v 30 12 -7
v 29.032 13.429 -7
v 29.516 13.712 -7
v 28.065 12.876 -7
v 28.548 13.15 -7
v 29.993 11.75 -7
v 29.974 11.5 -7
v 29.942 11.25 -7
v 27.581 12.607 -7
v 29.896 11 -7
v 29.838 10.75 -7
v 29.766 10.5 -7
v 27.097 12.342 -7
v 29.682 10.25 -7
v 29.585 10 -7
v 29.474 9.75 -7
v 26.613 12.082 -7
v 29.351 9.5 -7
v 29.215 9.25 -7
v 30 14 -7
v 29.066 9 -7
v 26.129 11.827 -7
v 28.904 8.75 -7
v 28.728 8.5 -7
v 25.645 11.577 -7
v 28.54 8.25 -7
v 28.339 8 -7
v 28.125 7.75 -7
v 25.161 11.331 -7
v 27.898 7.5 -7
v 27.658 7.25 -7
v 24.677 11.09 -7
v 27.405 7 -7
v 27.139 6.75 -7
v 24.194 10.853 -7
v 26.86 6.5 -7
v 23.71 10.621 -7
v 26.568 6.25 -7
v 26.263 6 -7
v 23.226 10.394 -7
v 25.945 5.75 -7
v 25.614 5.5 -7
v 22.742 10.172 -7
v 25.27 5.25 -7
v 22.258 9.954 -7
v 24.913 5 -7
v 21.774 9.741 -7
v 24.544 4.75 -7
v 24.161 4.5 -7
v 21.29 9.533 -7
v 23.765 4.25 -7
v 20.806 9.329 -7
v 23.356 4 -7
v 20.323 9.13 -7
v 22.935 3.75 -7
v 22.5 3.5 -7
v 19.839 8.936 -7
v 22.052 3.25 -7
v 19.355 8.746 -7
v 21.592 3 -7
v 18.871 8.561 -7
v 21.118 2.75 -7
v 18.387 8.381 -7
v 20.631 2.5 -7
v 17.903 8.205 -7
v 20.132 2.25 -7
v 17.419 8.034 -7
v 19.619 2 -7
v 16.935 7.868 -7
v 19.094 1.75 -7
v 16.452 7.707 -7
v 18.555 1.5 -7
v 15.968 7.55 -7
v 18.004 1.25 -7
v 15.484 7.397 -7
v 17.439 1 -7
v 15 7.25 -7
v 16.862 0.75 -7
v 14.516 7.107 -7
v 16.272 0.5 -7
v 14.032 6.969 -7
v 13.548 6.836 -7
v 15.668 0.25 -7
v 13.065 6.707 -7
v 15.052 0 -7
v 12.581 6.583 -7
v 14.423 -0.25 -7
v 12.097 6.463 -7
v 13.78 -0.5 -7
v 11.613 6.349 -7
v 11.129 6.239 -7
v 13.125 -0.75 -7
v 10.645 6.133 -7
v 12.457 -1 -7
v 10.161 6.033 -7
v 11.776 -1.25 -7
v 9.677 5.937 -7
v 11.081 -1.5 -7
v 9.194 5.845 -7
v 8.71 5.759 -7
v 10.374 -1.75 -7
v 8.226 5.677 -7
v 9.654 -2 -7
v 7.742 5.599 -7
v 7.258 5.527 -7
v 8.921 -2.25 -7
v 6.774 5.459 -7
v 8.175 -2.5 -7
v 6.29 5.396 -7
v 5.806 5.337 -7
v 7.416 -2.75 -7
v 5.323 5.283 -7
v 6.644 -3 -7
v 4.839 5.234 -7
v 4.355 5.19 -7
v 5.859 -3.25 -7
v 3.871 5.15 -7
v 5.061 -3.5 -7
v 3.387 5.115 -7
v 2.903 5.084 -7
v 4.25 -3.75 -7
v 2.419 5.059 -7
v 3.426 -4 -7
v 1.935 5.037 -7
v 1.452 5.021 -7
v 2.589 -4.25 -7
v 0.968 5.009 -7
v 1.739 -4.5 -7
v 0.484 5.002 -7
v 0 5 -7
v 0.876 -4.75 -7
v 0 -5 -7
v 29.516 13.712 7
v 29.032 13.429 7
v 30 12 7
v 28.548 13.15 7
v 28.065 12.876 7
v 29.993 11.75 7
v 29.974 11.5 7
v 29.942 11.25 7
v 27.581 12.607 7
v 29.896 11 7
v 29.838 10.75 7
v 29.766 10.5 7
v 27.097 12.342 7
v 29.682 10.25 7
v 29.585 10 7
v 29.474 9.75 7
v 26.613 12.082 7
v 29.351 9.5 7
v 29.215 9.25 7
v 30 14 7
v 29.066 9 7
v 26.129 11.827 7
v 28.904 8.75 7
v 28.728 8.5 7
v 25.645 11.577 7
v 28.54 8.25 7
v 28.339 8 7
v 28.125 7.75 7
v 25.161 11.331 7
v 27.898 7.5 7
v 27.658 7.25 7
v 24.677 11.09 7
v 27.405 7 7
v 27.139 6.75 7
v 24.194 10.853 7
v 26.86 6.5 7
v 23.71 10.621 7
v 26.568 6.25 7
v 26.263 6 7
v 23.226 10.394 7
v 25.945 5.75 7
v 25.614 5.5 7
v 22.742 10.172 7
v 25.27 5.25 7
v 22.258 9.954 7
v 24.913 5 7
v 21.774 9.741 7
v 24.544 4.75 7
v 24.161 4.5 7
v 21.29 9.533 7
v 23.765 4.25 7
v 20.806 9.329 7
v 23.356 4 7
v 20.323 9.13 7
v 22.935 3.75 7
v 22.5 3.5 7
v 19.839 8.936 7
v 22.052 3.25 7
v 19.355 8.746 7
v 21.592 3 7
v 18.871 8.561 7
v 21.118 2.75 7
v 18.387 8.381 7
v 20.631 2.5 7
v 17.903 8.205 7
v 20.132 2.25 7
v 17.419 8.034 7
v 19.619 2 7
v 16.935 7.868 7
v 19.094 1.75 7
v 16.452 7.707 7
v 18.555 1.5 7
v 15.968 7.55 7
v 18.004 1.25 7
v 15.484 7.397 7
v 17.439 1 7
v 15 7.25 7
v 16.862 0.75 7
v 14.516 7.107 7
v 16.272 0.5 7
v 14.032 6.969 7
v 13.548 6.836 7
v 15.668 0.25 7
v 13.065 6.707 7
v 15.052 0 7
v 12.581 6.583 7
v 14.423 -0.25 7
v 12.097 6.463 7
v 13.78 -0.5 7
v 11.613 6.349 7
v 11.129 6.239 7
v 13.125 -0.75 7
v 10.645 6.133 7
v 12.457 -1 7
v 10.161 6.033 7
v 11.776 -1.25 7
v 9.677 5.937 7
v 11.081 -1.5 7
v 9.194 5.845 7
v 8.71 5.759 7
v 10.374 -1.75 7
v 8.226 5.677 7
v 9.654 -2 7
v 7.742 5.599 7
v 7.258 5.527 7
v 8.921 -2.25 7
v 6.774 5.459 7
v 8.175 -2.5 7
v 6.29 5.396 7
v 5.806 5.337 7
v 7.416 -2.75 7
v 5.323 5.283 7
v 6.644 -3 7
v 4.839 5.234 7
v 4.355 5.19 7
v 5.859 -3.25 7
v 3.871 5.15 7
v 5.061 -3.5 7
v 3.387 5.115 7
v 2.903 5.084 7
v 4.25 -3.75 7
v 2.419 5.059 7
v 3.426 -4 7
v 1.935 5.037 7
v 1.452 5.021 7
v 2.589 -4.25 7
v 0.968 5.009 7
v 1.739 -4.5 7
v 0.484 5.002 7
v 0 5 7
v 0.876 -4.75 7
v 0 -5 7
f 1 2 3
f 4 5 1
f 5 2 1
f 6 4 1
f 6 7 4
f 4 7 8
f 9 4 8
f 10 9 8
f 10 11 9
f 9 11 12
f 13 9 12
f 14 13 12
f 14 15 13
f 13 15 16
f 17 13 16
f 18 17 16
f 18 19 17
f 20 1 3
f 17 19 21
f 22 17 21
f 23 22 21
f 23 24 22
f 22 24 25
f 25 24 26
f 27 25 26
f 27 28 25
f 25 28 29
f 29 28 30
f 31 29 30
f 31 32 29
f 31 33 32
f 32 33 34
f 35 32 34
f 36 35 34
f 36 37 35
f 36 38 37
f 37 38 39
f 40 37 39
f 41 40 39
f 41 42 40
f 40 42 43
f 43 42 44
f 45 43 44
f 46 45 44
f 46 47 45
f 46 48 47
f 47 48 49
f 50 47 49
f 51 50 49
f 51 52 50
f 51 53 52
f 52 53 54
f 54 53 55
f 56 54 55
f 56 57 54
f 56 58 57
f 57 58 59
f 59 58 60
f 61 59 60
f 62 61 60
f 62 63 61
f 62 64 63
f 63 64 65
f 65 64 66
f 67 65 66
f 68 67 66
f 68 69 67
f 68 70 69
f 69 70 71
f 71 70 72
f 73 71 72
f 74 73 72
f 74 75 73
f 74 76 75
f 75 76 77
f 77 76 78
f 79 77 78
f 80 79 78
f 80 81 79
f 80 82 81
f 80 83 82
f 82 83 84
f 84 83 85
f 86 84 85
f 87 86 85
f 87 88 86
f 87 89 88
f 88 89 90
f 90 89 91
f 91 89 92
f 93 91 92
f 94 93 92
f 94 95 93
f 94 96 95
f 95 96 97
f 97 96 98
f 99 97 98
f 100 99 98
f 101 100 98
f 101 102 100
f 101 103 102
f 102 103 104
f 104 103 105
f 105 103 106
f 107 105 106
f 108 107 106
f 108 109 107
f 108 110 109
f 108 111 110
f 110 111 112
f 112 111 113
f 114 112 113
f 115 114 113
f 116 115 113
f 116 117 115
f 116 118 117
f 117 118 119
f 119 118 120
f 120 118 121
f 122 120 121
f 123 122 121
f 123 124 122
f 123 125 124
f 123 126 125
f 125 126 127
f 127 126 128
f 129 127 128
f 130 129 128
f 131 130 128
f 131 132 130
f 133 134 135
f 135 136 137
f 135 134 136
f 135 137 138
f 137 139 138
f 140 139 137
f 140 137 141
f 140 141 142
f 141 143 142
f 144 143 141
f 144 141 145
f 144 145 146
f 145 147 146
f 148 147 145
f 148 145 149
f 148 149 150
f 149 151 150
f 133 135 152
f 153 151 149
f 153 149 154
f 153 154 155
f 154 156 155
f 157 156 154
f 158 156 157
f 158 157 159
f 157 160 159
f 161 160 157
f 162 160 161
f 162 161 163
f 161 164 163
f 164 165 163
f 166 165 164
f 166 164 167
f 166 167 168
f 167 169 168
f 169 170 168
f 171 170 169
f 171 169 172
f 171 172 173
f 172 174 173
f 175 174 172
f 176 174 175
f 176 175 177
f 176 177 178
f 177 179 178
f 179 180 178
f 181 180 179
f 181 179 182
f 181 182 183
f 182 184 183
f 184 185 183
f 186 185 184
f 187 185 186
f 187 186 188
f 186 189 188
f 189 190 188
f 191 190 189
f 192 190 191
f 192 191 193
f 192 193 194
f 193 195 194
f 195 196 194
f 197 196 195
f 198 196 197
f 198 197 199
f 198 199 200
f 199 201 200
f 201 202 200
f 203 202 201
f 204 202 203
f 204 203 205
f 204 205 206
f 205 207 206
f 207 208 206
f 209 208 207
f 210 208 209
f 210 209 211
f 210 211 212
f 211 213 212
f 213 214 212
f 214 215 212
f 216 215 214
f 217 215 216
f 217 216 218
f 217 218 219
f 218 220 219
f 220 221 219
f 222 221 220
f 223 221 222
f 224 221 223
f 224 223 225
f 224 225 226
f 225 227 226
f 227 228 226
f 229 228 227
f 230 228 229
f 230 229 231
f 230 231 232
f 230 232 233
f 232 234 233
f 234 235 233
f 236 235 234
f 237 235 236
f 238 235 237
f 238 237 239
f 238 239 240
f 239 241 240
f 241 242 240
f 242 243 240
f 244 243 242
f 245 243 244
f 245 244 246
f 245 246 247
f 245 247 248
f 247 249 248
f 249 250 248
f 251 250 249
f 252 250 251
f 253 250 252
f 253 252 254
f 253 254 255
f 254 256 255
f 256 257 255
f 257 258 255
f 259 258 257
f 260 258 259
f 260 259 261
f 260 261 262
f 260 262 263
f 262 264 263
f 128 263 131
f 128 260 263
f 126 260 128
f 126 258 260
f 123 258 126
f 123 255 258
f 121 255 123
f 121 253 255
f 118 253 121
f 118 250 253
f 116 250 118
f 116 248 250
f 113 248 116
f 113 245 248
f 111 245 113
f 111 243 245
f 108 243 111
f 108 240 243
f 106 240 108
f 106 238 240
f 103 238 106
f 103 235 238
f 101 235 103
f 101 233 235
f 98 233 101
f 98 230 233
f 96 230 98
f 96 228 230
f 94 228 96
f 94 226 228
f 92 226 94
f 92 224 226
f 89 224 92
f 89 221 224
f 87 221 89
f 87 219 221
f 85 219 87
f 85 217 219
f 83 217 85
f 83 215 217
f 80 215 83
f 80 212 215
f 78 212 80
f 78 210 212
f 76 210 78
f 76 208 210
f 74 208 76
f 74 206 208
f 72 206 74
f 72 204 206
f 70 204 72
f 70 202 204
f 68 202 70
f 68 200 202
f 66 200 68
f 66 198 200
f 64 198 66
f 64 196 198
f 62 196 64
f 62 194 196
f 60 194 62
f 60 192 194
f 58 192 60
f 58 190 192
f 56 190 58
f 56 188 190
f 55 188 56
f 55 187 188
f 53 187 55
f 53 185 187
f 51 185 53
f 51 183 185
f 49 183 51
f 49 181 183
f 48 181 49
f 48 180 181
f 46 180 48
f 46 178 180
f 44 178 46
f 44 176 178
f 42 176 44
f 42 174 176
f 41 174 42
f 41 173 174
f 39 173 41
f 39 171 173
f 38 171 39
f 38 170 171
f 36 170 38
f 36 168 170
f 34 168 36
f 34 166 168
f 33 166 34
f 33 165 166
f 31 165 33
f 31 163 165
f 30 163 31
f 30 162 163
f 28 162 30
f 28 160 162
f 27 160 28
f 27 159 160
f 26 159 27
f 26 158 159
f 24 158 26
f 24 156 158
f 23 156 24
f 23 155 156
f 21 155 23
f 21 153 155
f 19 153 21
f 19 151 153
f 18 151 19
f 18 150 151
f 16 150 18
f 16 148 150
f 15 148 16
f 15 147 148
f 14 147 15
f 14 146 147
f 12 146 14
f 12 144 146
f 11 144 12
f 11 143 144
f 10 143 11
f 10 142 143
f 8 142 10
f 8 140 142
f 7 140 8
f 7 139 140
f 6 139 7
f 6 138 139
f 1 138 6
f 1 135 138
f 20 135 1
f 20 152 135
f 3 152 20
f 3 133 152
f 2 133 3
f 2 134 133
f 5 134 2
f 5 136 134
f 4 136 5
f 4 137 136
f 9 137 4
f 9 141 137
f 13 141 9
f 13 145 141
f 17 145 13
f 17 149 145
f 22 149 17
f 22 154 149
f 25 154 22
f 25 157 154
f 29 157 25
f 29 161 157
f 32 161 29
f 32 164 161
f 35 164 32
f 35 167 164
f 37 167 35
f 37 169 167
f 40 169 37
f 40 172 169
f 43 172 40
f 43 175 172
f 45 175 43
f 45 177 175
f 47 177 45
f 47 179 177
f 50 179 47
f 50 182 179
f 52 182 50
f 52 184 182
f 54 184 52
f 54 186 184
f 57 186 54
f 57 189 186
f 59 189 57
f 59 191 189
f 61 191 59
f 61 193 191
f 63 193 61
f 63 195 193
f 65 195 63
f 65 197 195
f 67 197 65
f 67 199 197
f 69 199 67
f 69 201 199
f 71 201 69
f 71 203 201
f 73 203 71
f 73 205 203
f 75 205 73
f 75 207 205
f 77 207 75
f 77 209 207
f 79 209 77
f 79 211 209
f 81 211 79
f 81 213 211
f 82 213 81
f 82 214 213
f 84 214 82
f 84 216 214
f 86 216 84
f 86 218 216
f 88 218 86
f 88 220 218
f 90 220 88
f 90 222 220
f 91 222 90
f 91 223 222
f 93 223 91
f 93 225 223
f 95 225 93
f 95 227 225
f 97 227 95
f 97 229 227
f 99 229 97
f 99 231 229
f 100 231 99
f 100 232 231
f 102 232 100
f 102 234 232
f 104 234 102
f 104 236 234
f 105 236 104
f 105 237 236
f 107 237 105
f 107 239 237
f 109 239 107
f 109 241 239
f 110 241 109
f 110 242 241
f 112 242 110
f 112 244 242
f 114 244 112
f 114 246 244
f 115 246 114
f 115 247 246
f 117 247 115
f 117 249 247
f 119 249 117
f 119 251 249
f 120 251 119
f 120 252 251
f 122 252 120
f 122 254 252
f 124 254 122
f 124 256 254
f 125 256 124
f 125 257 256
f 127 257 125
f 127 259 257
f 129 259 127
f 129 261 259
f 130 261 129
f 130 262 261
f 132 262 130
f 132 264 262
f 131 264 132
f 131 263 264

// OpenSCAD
// file: ../../utilities/math.scad
function linear_interpolate(
  from,
  to,
  mix
) = from + (to - from) * mix;

function remap(
  value,
  fromLow,
  fromHigh,
  toLow,
  toHigh
) = linear_interpolate(toLow, toHigh, (value - fromLow) / (fromHigh - fromLow));
// file: measurements.scad
hero_dualie_trigger_length = 30;
hero_dualie_trigger_base_a = 5;
hero_dualie_trigger_base_b = -5;
hero_dualie_trigger_tip_a = 14;
hero_dualie_trigger_tip_b = 12;
hero_dualie_trigger_thickness = 14;
// file: ../../utilities/curves.scad
use <math.scad>;

// Approximates a curve by interpolating between two coordinates with a
// different rate of acceleration on each axis.
function utilities_curves_exponential(
  // The coordinate to interpolate from.
  from,
  // The coordinate to interpolate to.
  to,
  // The exponent on each axis, where:
  // - 0...1 starts fast then decelerates.
  // - 1 is linear.
  // - 1...infinity starts slow then accelerates.
  exponents
) = [
  for (progress = [0:utilities_curves_approximate_segments(from, to)]) [
    for (axis = [0:len(from) - 1])
      linear_interpolate(
        from[axis],
        to[axis],
        pow(
          progress / utilities_curves_approximate_segments(from, to),
          exponents[axis]
        )
      )
  ]
];

// Attempts to guess how many segments should be present on a curve.
function utilities_curves_approximate_segments(
  // The start of the curve.
  from,
  // The end of the curve.
  to
) = max(1, round(norm(to - from) / $fs) - 1);
// file: shape.scad
include <../../settings.scad>;
use <../../utilities/curves.scad>;
include <measurements.scad>;

module hero_dualie_trigger_shape() {
  top = utilities_curves_exponential(
    [0, hero_dualie_trigger_base_a],
    [hero_dualie_trigger_length, hero_dualie_trigger_tip_a],
    [1, 2]
  );

  bottom = utilities_curves_exponential(
    [hero_dualie_trigger_length, hero_dualie_trigger_tip_b],
    [0, hero_dualie_trigger_base_b],
    [2, 1]
  );

  points = concat(top, bottom);

  linear_extrude(hero_dualie_trigger_thickness, center = true) {
    polygon(points);
  };
};
// file: ../../settings.scad
// When true, lower resolution primitives will be used.
draft = false;

$fs = draft ? 2 : 1;
$fa = draft ? 12 : 6;

// The amount of space left between parts which must fit together tightly.
tight_tolerance = 0.6;

// The amount of space left between parts which must fit together loosely.
loose_tolerance = 1;
// main file
include <../../settings.scad>;
use <shape.scad>;

hero_dualie_trigger_shape();
